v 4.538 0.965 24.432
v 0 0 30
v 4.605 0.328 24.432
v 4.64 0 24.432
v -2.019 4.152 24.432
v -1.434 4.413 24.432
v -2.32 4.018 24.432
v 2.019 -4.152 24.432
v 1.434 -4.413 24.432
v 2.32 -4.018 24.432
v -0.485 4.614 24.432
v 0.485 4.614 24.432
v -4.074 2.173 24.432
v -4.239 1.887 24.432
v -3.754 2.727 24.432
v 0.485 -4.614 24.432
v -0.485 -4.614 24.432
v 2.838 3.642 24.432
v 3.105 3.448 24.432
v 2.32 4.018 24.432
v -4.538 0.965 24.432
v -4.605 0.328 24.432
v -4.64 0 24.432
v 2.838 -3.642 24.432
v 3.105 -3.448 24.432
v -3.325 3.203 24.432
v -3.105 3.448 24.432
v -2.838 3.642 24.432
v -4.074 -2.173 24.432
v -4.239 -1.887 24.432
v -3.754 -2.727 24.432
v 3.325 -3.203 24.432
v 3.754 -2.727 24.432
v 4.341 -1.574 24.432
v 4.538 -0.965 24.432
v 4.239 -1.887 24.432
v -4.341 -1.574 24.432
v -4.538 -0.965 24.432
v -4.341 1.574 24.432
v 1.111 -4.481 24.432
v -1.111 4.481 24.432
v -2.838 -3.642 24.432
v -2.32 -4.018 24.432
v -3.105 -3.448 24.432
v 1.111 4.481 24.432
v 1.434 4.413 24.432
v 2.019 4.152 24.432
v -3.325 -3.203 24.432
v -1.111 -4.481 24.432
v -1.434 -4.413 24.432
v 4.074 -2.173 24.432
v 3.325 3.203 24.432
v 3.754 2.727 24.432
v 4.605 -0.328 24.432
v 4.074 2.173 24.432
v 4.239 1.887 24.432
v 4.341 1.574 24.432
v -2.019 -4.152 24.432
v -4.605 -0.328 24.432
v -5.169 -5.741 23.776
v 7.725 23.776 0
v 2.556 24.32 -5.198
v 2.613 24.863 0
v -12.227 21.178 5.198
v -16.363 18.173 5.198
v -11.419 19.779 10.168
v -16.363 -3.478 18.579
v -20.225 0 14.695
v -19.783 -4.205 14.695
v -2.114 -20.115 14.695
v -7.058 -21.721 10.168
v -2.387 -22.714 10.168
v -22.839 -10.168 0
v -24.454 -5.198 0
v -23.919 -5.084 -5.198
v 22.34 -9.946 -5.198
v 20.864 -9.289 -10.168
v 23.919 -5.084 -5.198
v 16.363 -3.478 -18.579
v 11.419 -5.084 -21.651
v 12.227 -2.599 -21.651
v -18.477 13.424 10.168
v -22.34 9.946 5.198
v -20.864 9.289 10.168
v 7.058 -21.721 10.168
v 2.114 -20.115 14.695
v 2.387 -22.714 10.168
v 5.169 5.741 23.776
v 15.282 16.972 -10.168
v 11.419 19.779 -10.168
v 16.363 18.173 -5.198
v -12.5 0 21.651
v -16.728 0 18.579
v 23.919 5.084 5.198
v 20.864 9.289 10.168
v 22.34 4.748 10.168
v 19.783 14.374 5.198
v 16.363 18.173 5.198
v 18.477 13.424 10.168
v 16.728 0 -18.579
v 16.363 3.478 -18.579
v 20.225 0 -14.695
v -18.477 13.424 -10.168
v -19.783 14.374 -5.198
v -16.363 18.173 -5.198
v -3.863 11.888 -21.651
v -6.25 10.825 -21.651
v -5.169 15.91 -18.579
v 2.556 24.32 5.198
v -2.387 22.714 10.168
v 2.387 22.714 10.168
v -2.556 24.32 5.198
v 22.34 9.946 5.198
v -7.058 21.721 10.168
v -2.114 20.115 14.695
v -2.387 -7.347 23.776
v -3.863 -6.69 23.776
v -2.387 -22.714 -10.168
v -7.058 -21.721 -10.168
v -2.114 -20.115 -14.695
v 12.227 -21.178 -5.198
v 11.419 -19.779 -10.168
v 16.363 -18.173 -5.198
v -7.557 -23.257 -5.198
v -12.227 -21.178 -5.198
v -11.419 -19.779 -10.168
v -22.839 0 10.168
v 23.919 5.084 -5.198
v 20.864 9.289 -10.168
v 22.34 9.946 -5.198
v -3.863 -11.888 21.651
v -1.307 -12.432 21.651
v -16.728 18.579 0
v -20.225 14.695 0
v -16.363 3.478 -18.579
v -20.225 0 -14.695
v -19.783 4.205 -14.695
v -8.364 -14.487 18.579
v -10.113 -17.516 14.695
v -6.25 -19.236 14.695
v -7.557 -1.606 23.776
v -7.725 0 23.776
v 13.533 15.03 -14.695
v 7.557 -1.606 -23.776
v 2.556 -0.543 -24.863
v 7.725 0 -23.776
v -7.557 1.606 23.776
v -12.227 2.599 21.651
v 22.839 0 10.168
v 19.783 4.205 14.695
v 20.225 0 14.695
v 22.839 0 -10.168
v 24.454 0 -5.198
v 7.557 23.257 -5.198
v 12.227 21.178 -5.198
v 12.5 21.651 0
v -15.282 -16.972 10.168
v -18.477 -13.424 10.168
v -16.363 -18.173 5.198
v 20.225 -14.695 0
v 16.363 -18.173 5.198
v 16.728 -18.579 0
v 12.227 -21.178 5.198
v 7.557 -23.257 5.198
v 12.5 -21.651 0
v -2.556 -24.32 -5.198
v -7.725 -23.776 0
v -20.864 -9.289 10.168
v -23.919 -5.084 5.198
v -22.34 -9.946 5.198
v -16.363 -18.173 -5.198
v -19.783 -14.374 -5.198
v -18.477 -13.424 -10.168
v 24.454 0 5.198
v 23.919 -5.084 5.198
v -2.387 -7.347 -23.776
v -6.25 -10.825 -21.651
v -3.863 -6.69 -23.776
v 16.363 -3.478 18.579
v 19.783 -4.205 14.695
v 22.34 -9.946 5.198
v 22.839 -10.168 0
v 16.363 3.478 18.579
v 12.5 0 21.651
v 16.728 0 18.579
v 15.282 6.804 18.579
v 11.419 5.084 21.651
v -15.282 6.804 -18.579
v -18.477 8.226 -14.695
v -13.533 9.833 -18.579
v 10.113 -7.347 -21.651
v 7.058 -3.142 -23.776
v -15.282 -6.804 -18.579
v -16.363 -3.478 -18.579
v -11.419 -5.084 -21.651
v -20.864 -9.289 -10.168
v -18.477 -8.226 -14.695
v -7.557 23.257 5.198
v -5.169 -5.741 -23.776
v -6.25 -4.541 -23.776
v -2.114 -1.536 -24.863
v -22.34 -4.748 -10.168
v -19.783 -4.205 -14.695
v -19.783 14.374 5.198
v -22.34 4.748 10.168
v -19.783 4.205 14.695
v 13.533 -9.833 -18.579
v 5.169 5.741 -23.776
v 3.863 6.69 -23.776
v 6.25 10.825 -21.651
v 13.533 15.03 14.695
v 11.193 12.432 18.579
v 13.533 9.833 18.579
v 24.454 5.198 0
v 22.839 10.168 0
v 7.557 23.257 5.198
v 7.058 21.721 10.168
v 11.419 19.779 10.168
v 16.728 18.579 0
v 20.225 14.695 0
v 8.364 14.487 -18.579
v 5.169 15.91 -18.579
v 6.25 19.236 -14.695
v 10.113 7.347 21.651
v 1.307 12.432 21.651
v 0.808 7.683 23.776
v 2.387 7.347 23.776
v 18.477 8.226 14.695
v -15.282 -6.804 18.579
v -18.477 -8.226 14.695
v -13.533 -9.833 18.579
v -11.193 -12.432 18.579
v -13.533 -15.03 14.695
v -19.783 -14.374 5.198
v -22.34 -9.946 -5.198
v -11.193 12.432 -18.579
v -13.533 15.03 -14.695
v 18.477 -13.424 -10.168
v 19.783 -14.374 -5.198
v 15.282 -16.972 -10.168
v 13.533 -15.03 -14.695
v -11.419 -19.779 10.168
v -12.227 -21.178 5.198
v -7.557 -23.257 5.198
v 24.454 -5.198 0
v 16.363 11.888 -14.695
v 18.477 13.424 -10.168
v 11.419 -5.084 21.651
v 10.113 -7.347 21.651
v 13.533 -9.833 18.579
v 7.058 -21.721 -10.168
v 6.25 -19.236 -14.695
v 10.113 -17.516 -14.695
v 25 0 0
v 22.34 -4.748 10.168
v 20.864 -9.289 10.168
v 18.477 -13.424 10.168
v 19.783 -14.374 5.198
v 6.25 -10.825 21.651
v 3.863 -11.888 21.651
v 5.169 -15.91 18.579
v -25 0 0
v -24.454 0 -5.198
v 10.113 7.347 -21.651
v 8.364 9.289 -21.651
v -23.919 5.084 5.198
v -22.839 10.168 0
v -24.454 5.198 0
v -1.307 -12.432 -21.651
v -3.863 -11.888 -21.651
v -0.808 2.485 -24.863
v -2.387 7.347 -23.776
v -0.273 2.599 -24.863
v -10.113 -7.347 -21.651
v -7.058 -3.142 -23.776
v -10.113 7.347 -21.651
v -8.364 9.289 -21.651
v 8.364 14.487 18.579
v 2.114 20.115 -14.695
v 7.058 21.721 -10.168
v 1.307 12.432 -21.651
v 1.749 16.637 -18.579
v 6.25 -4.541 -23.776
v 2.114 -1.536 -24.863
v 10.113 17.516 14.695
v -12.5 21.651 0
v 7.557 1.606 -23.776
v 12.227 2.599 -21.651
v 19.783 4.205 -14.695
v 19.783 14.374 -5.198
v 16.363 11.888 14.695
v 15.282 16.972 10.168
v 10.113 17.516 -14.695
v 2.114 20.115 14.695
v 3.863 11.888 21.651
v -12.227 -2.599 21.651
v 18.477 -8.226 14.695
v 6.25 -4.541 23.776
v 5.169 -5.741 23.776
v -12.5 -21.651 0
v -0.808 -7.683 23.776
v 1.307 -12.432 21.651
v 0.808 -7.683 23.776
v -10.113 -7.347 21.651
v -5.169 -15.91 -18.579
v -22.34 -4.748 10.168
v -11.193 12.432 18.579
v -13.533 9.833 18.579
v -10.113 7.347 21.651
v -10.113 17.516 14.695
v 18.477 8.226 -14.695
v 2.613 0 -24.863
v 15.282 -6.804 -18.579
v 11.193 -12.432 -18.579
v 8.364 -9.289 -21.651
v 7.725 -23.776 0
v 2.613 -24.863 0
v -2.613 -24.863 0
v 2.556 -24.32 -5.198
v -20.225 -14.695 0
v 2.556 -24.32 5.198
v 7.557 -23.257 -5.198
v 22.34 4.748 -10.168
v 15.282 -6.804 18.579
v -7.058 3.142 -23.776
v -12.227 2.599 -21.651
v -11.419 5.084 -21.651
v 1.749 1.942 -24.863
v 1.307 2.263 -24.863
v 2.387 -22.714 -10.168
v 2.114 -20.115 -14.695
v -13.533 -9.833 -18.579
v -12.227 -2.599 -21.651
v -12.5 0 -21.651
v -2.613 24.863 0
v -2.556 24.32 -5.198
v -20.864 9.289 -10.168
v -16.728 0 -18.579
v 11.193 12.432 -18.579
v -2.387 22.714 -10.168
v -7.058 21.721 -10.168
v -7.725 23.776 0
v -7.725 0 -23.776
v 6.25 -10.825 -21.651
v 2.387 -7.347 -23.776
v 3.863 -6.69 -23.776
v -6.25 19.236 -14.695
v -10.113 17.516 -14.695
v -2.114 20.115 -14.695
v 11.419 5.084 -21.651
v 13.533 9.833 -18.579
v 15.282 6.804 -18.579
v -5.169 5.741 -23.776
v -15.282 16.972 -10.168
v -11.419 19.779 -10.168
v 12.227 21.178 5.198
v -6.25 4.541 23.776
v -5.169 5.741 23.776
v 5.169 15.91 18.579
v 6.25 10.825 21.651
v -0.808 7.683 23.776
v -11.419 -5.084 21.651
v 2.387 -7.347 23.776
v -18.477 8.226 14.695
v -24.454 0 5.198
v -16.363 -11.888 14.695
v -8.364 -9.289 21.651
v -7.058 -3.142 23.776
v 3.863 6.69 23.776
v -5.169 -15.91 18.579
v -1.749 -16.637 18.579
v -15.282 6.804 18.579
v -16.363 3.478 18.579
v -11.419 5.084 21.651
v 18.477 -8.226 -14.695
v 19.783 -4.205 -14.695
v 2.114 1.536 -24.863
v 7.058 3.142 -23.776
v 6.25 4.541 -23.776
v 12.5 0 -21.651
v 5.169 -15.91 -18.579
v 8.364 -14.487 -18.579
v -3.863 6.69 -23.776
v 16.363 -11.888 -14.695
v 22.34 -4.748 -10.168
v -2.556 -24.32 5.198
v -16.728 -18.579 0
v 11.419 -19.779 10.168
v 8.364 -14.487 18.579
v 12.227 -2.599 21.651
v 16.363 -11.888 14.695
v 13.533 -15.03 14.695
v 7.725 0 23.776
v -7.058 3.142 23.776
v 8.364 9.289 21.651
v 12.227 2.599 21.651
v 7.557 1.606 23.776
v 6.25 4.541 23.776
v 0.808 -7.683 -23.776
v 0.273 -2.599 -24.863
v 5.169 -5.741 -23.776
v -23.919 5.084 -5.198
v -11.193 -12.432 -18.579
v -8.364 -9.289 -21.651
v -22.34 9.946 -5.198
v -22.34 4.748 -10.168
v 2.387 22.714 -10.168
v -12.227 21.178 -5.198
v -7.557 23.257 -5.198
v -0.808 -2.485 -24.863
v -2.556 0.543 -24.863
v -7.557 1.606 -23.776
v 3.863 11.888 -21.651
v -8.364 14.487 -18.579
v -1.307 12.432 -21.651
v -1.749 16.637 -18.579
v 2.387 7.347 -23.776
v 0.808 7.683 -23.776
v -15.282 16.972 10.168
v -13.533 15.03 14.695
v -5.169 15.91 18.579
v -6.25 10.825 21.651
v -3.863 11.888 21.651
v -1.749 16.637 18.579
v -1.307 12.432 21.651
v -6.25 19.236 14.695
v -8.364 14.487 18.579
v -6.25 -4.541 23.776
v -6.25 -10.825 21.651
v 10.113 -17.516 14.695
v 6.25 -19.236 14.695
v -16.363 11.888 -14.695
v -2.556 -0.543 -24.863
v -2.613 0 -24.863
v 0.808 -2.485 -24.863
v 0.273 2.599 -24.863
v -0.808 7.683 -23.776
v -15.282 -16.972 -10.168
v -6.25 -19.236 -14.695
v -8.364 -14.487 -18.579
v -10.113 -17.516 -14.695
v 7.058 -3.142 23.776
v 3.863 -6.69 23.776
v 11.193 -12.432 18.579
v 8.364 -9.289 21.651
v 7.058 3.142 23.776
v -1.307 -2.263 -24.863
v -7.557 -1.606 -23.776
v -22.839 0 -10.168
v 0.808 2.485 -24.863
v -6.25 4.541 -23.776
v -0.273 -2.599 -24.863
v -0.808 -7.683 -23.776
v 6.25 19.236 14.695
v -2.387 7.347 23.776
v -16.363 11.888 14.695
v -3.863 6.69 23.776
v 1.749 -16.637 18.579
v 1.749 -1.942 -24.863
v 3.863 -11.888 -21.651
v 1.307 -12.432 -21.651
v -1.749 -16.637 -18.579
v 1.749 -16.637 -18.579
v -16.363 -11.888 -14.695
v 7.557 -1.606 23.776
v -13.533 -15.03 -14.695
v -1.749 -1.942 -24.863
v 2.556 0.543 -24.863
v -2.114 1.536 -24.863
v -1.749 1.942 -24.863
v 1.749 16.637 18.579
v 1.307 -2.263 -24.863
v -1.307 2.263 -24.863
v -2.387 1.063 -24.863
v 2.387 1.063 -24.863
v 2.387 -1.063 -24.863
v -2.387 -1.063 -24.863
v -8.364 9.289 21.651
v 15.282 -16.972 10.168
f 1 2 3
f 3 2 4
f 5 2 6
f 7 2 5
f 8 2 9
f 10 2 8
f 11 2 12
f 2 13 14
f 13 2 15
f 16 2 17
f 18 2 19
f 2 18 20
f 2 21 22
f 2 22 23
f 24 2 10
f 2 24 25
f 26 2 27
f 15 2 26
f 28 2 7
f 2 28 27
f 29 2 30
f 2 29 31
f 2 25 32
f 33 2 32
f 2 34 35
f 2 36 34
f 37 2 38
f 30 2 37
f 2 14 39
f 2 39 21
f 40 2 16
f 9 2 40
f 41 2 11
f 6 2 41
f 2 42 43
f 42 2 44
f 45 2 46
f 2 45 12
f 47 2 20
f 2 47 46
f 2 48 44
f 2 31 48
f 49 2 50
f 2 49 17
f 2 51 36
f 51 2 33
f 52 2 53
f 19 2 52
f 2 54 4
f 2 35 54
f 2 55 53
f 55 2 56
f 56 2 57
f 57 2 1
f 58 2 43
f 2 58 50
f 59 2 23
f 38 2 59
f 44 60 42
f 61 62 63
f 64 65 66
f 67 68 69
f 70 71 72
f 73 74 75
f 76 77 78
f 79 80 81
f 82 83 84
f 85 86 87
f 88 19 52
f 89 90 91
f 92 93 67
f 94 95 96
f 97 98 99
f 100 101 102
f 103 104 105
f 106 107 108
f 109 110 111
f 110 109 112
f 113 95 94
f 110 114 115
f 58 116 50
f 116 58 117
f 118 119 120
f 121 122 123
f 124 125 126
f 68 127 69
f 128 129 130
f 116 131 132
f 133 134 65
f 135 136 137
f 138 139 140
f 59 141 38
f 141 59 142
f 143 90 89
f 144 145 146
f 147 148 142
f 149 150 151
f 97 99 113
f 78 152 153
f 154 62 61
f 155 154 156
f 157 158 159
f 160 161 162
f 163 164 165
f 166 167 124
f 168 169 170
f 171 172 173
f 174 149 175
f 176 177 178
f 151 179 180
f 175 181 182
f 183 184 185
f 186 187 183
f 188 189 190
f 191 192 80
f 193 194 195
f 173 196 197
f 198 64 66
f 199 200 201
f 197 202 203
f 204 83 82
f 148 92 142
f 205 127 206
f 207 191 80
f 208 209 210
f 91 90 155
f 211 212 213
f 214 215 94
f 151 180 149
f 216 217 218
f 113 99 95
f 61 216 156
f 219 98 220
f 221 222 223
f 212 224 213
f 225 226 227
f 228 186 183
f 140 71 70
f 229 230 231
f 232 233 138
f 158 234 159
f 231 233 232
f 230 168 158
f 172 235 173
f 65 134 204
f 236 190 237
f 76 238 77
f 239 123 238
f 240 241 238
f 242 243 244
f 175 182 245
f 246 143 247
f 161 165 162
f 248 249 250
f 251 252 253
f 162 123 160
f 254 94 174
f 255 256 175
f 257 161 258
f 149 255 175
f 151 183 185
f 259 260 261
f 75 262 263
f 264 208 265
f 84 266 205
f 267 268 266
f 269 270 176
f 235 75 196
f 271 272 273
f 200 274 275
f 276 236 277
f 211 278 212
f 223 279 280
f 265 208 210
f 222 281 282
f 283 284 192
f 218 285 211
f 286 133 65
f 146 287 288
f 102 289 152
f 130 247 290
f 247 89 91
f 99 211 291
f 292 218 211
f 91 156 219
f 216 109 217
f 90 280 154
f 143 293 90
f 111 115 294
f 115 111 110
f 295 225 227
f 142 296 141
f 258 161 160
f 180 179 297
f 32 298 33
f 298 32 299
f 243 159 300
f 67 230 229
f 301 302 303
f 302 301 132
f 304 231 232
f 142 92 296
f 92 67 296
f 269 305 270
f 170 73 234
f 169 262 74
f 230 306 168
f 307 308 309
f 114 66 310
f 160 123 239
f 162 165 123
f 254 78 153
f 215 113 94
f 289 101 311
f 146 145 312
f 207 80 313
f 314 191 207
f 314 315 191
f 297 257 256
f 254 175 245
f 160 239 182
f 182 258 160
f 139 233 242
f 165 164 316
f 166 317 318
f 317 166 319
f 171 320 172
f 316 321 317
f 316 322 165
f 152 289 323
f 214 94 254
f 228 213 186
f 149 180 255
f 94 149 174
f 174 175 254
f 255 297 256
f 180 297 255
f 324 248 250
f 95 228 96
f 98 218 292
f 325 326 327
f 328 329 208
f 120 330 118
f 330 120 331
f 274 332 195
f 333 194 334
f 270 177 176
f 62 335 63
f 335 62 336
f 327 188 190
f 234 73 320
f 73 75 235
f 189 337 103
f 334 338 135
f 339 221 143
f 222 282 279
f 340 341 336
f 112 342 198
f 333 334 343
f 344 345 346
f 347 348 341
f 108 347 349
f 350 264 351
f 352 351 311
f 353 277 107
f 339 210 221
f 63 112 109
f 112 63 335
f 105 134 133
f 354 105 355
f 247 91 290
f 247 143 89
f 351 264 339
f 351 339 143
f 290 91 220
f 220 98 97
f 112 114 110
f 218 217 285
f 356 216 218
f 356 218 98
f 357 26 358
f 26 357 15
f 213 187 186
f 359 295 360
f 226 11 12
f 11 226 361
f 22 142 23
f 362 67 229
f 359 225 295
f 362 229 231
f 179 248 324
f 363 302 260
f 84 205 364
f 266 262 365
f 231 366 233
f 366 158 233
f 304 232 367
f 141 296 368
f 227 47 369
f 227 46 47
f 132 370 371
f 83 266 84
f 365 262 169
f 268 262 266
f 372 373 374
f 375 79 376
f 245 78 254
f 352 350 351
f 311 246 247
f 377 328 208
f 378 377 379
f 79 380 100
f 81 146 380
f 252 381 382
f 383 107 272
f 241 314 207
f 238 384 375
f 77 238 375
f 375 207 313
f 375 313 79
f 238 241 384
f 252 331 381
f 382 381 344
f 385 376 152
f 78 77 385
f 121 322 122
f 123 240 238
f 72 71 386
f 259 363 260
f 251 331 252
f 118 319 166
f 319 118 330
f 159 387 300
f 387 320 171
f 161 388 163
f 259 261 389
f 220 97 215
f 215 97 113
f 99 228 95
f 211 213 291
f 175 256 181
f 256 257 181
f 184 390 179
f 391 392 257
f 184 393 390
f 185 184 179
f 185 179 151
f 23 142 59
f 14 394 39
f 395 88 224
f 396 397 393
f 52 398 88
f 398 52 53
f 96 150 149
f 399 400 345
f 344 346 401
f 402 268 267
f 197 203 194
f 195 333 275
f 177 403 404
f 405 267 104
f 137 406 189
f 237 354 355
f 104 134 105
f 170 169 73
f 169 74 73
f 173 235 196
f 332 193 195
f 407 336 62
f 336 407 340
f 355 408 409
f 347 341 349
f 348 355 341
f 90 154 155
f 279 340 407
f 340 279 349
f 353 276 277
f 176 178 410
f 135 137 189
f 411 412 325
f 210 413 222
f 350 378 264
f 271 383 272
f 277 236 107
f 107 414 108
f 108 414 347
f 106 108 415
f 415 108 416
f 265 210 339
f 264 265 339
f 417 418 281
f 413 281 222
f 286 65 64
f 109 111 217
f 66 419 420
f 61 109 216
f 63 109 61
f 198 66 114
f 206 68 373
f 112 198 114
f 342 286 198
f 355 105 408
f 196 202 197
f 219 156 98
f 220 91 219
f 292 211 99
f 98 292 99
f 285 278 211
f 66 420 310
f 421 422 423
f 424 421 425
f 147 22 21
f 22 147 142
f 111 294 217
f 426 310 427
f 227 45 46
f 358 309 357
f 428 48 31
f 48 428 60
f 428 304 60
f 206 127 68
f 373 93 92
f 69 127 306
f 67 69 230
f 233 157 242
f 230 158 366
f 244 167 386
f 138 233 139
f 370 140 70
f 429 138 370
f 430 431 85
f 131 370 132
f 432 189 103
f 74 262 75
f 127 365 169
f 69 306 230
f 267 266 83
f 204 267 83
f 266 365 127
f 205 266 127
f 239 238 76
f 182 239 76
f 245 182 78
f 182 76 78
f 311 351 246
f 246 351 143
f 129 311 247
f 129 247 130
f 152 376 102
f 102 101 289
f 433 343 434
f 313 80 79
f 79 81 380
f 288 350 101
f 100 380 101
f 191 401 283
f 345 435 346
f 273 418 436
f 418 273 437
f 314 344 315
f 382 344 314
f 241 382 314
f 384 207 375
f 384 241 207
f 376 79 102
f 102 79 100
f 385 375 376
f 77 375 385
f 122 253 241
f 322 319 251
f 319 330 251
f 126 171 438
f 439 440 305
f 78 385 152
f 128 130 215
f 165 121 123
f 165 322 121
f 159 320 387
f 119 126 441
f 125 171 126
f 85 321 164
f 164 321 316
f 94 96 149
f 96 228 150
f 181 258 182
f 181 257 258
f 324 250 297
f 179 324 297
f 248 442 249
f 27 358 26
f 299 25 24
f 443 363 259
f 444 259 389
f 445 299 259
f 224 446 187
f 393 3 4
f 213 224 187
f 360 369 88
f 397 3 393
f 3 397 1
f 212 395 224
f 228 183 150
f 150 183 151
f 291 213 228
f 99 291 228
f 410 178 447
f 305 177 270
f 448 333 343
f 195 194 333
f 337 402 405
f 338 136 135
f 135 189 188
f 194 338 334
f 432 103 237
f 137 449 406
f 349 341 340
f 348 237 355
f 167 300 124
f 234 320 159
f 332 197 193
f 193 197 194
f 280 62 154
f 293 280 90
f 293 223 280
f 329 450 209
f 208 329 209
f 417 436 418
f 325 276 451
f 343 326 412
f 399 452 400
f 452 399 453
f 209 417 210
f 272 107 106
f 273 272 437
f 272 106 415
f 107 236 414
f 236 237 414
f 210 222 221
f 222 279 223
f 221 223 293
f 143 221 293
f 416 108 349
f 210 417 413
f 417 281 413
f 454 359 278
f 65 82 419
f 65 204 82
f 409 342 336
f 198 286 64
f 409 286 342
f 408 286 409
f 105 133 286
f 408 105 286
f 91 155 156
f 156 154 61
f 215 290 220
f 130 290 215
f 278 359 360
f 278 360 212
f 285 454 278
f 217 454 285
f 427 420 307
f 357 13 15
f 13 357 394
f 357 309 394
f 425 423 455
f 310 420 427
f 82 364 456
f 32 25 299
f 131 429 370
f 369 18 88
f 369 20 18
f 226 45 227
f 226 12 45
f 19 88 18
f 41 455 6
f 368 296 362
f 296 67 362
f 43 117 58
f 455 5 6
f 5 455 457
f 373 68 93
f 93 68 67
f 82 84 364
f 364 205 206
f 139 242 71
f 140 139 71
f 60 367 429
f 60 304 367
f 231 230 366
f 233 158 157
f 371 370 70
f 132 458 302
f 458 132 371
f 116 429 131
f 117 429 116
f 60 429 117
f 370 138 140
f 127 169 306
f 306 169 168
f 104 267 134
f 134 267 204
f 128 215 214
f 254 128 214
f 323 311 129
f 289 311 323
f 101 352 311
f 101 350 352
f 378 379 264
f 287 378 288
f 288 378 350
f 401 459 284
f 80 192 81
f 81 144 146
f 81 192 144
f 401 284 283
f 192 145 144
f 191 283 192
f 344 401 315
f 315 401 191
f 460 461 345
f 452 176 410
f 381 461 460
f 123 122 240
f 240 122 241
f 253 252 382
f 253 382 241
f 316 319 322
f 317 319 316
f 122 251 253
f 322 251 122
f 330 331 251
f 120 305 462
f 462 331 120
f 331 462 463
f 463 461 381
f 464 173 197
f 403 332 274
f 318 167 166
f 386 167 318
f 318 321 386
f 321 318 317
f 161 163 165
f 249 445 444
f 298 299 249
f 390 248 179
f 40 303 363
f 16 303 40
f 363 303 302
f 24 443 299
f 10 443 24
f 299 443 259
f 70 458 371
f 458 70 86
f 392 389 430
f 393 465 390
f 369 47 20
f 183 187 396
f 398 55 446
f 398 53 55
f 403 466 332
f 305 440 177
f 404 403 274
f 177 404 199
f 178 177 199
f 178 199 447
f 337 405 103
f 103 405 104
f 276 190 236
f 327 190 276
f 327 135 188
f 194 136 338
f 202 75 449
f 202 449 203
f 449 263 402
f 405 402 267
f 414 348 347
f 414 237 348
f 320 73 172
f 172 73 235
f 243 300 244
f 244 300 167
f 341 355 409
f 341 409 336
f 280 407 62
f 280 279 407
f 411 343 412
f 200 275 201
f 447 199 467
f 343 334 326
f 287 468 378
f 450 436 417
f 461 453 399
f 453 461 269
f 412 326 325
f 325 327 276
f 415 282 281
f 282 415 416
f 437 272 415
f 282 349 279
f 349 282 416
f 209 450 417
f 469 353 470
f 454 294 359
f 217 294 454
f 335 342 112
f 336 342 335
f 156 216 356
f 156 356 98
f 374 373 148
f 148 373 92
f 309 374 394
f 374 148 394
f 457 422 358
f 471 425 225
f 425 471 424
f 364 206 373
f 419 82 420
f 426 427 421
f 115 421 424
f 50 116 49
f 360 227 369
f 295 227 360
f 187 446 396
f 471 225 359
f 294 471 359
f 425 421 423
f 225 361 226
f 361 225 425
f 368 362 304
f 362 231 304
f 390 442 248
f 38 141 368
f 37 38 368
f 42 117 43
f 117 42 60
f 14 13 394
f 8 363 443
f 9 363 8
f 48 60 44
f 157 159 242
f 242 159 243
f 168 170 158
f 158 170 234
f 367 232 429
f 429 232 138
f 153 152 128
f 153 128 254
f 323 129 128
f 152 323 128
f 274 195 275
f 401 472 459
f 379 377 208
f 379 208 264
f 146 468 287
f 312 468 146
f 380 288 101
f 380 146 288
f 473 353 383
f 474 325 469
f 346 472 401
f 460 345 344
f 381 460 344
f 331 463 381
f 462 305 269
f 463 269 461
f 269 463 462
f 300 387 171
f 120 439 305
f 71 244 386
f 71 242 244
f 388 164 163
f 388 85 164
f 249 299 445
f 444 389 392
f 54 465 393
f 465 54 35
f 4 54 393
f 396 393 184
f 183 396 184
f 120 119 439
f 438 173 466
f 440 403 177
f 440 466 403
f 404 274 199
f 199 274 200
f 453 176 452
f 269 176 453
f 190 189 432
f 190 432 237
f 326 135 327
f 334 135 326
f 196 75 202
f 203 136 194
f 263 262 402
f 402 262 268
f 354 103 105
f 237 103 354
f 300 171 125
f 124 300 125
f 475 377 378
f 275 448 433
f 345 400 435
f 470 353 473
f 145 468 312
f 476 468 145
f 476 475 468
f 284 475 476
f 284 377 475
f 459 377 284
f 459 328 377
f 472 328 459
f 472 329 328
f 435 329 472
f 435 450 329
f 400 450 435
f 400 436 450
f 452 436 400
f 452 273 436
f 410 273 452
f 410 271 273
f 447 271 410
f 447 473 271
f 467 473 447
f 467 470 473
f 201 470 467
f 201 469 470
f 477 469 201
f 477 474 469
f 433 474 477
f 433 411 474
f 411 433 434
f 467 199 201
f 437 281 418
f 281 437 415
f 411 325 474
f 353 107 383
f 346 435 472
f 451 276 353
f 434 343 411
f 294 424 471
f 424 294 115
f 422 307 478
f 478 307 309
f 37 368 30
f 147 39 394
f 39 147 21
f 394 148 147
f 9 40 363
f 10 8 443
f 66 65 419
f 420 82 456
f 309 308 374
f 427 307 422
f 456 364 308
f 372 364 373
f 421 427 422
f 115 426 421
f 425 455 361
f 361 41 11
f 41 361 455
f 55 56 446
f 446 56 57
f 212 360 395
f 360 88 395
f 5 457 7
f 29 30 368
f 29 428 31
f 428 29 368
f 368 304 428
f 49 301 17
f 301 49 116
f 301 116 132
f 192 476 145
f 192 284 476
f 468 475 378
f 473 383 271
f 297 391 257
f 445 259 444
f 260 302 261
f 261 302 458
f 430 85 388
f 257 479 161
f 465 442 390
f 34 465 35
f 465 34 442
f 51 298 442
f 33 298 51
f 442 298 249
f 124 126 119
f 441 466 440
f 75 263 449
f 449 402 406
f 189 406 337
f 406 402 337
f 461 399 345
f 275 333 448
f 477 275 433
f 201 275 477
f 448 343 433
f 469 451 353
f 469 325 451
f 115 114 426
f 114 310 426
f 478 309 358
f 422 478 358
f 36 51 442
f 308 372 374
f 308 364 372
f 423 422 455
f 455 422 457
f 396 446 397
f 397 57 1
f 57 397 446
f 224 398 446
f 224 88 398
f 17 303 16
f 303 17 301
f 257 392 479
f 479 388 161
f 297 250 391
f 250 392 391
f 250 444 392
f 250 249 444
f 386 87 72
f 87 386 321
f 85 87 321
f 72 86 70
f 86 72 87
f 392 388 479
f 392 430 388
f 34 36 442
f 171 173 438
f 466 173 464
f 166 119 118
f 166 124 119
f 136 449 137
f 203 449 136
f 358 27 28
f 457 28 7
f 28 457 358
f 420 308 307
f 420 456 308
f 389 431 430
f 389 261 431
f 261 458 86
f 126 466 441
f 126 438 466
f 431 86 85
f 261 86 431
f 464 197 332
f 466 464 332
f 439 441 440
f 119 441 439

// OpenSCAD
// пирамида на голубой плонете
color("orange") cylinder(r1=25,r2=0,h=30);
color ("blue") sphere(25);
